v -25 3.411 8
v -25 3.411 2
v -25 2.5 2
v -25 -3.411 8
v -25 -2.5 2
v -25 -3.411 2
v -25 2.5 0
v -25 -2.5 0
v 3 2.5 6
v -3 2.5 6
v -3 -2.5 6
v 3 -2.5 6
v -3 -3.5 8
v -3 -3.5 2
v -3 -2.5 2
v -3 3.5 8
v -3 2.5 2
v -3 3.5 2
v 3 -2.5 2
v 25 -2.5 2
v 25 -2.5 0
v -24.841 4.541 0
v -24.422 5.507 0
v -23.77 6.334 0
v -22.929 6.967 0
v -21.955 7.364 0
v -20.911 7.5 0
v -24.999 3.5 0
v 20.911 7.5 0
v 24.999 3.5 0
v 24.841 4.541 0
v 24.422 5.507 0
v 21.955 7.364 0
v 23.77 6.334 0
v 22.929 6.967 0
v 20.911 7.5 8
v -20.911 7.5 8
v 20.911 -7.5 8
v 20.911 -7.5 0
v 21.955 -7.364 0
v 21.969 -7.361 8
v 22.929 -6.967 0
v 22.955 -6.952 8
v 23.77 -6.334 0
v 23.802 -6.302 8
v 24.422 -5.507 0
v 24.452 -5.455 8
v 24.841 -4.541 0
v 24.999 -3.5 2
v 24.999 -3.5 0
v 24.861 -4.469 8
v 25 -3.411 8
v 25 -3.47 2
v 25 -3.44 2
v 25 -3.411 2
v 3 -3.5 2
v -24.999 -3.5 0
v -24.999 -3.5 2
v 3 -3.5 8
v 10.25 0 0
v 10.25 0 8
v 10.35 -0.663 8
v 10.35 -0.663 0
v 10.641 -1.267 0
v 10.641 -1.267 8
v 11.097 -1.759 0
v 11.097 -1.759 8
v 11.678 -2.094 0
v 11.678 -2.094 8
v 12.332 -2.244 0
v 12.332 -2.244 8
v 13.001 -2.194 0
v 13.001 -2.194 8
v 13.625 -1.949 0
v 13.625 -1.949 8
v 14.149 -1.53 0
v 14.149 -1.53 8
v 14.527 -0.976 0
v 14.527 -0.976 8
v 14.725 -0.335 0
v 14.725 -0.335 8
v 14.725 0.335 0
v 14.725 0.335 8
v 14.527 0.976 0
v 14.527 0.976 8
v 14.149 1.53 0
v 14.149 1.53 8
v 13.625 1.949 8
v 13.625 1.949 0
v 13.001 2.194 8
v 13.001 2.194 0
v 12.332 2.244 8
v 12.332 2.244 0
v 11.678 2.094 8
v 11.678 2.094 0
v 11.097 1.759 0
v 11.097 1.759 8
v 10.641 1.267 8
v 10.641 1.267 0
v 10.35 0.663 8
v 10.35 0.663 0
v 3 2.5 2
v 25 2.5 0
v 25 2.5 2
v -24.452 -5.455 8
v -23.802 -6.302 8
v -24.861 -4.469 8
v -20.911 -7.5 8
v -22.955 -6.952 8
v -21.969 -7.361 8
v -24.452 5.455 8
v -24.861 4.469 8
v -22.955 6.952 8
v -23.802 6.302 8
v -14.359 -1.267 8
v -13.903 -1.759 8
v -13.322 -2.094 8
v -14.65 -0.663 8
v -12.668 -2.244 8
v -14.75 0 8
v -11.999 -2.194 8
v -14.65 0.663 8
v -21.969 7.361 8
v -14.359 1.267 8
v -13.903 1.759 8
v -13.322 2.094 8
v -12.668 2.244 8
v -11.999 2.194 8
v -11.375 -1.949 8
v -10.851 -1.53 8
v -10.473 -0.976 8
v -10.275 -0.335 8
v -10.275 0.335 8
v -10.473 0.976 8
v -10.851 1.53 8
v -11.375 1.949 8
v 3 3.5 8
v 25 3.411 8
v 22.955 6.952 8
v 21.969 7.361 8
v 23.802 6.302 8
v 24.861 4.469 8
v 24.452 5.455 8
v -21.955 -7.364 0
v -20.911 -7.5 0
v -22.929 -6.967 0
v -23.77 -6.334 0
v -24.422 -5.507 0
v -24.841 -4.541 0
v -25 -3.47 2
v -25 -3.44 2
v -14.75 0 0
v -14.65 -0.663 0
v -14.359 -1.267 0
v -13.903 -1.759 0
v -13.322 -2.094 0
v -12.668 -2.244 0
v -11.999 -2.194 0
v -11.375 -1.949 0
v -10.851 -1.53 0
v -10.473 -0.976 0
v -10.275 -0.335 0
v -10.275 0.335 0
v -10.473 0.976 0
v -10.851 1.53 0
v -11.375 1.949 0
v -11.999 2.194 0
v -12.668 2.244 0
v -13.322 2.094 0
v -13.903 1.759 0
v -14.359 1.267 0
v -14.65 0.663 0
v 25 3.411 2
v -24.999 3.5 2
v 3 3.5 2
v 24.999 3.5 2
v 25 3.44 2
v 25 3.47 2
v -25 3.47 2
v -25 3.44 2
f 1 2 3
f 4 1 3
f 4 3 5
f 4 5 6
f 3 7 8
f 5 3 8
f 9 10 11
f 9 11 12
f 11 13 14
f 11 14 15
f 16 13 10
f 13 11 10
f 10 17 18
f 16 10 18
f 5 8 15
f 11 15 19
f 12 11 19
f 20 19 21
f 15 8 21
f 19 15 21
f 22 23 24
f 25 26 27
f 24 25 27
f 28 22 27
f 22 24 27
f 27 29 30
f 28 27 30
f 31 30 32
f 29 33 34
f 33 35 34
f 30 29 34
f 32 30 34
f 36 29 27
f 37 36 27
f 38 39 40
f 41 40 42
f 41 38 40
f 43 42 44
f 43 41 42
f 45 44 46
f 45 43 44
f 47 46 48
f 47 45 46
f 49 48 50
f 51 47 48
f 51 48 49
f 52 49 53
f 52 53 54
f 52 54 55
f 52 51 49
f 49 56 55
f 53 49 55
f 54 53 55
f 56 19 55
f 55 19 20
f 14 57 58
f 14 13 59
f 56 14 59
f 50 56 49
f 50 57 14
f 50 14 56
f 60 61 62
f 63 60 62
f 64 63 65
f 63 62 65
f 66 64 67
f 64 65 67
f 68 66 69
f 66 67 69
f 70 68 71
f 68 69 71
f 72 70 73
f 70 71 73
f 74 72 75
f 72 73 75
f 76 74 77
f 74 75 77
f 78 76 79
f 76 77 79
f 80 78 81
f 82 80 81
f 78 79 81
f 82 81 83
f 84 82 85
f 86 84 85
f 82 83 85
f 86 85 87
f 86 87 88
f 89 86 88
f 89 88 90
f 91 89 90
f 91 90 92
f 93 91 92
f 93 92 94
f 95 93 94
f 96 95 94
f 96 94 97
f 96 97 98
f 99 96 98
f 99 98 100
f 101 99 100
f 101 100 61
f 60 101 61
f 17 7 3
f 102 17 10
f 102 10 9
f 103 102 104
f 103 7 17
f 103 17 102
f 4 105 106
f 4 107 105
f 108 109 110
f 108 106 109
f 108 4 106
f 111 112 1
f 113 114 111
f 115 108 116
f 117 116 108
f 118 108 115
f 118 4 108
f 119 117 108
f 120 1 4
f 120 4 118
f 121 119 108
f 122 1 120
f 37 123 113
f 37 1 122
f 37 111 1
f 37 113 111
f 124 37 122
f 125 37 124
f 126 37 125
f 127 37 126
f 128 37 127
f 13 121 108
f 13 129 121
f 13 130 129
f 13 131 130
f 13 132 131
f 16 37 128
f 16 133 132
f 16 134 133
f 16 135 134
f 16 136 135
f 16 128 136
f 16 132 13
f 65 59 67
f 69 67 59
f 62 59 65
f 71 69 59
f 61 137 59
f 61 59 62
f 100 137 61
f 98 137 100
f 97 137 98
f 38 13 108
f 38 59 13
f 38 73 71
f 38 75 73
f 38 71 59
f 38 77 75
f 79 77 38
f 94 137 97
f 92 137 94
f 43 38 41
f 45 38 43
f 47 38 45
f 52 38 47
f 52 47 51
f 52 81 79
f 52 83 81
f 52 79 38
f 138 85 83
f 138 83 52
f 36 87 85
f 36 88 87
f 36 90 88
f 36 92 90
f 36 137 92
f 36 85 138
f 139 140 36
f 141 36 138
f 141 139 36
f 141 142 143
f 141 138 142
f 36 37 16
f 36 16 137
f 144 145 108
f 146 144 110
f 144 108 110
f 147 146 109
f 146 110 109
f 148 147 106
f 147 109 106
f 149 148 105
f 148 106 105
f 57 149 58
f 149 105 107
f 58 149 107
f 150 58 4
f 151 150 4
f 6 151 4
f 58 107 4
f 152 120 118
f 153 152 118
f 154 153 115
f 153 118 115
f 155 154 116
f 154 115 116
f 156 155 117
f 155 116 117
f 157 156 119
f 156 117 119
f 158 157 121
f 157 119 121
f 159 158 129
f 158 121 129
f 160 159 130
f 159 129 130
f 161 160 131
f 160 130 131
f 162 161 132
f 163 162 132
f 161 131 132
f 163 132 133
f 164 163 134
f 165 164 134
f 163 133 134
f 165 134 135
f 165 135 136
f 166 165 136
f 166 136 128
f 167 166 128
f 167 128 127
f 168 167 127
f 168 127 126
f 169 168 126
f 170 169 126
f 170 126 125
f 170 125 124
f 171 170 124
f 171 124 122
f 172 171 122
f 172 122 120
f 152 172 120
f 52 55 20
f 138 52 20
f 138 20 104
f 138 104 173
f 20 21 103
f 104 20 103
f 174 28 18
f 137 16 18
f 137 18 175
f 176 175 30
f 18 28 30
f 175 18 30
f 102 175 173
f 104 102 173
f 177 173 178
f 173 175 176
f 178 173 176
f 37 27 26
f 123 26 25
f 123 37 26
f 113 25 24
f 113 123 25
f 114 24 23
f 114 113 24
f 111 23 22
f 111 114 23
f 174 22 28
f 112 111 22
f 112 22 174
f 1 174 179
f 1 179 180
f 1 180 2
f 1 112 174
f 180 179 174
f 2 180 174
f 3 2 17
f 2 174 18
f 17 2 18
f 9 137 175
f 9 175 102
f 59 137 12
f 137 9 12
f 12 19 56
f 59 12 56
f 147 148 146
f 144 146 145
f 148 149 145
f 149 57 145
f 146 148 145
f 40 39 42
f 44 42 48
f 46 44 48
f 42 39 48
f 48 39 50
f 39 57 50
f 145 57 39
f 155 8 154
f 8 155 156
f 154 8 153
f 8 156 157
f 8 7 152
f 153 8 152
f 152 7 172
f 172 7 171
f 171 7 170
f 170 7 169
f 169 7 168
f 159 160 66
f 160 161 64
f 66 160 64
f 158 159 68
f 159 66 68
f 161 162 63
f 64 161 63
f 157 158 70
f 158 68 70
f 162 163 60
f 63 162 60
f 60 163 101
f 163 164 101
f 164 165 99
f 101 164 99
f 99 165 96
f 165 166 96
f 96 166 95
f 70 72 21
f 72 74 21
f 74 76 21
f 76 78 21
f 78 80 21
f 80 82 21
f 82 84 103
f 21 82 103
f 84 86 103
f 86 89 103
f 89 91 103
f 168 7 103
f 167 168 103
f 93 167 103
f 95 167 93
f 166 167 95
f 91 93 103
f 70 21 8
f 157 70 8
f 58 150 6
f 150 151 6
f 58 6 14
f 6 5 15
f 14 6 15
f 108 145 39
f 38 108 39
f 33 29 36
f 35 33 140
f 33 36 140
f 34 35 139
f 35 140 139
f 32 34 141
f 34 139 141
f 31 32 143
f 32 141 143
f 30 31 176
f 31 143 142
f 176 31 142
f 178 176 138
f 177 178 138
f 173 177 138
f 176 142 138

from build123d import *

# Parameters (mm, degrees)
F0_W     = 22
F0_H     = 1
F0_H_2   = 5
F1_DEPTH = 8
F0_W_2   = 6
F2_DEPTH = 17.526
F3_D     = 4.5
F3_DEPTH = 10
F4_DEPTH = 6
F5_DEPTH = 2
F6_R     = 4.0894


with BuildPart() as f1:
    # F0 (on Top) → F1 (new body)
    with BuildSketch(Plane.XY):
        Polygon((25, 3.5), (25, 7.5), (-25, 7.5), (-25, 3.5), (-3, 3.5), (3, 3.5), align=None)
        with Locations((14, -3)):
            Rectangle(F0_W, F0_H)
        with Locations((-14, -3)):
            Rectangle(F0_W, F0_H)
        Polygon((25, -7.5), (25, -3.5), (3, -3.5), (-3, -3.5), (-25, -3.5), (-25, -7.5), align=None)
        with Locations((-14, 0)):
            Rectangle(F0_W, F0_H_2)
        with Locations((14, 0)):
            Rectangle(F0_W, F0_H_2)
        with Locations((14, 3)):
            Rectangle(F0_W, F0_H)
        with Locations((-14, 3)):
            Rectangle(F0_W, F0_H)
    extrude(amount=F1_DEPTH)

    # F0 (on Top) → F2 (cut)
    with BuildSketch(Plane.XY):
        with Locations((0, 3)):
            Rectangle(F0_W_2, F0_H)
    extrude(amount=F2_DEPTH, mode=Mode.SUBTRACT)

    # F3
    with Locations(Plane(origin=(0, 0, 0), x_dir=(1, 0, 0), z_dir=(0, 0, -1))):
        with Locations((-12.5, 0), (12.5, 0)):
            Hole(F3_D / 2, depth=F3_DEPTH)

    # F0 (on Top) → F4 (join)
    with BuildSketch(Plane.XY):
        Rectangle(F0_W_2, F0_H_2)
    extrude(amount=F4_DEPTH)

    # F0 (on Top) → F5 (cut)
    with BuildSketch(Plane.XY):
        with Locations((-14, -3)):
            Rectangle(F0_W, F0_H)
        with Locations((14, -3)):
            Rectangle(F0_W, F0_H)
        with Locations((14, 3)):
            Rectangle(F0_W, F0_H)
        with Locations((-14, 3)):
            Rectangle(F0_W, F0_H)
    extrude(amount=F5_DEPTH, mode=Mode.SUBTRACT)

    # F6
    f6_edges = [f1.edges().sort_by_distance(p)[0] for p in [
        (25, -7.5, 4),
        (25, 7.5, 4),
        (-25, 7.5, 4),
        (-25, -7.5, 4),
    ]]
    fillet(f6_edges, radius=F6_R)


solid = f1.part
